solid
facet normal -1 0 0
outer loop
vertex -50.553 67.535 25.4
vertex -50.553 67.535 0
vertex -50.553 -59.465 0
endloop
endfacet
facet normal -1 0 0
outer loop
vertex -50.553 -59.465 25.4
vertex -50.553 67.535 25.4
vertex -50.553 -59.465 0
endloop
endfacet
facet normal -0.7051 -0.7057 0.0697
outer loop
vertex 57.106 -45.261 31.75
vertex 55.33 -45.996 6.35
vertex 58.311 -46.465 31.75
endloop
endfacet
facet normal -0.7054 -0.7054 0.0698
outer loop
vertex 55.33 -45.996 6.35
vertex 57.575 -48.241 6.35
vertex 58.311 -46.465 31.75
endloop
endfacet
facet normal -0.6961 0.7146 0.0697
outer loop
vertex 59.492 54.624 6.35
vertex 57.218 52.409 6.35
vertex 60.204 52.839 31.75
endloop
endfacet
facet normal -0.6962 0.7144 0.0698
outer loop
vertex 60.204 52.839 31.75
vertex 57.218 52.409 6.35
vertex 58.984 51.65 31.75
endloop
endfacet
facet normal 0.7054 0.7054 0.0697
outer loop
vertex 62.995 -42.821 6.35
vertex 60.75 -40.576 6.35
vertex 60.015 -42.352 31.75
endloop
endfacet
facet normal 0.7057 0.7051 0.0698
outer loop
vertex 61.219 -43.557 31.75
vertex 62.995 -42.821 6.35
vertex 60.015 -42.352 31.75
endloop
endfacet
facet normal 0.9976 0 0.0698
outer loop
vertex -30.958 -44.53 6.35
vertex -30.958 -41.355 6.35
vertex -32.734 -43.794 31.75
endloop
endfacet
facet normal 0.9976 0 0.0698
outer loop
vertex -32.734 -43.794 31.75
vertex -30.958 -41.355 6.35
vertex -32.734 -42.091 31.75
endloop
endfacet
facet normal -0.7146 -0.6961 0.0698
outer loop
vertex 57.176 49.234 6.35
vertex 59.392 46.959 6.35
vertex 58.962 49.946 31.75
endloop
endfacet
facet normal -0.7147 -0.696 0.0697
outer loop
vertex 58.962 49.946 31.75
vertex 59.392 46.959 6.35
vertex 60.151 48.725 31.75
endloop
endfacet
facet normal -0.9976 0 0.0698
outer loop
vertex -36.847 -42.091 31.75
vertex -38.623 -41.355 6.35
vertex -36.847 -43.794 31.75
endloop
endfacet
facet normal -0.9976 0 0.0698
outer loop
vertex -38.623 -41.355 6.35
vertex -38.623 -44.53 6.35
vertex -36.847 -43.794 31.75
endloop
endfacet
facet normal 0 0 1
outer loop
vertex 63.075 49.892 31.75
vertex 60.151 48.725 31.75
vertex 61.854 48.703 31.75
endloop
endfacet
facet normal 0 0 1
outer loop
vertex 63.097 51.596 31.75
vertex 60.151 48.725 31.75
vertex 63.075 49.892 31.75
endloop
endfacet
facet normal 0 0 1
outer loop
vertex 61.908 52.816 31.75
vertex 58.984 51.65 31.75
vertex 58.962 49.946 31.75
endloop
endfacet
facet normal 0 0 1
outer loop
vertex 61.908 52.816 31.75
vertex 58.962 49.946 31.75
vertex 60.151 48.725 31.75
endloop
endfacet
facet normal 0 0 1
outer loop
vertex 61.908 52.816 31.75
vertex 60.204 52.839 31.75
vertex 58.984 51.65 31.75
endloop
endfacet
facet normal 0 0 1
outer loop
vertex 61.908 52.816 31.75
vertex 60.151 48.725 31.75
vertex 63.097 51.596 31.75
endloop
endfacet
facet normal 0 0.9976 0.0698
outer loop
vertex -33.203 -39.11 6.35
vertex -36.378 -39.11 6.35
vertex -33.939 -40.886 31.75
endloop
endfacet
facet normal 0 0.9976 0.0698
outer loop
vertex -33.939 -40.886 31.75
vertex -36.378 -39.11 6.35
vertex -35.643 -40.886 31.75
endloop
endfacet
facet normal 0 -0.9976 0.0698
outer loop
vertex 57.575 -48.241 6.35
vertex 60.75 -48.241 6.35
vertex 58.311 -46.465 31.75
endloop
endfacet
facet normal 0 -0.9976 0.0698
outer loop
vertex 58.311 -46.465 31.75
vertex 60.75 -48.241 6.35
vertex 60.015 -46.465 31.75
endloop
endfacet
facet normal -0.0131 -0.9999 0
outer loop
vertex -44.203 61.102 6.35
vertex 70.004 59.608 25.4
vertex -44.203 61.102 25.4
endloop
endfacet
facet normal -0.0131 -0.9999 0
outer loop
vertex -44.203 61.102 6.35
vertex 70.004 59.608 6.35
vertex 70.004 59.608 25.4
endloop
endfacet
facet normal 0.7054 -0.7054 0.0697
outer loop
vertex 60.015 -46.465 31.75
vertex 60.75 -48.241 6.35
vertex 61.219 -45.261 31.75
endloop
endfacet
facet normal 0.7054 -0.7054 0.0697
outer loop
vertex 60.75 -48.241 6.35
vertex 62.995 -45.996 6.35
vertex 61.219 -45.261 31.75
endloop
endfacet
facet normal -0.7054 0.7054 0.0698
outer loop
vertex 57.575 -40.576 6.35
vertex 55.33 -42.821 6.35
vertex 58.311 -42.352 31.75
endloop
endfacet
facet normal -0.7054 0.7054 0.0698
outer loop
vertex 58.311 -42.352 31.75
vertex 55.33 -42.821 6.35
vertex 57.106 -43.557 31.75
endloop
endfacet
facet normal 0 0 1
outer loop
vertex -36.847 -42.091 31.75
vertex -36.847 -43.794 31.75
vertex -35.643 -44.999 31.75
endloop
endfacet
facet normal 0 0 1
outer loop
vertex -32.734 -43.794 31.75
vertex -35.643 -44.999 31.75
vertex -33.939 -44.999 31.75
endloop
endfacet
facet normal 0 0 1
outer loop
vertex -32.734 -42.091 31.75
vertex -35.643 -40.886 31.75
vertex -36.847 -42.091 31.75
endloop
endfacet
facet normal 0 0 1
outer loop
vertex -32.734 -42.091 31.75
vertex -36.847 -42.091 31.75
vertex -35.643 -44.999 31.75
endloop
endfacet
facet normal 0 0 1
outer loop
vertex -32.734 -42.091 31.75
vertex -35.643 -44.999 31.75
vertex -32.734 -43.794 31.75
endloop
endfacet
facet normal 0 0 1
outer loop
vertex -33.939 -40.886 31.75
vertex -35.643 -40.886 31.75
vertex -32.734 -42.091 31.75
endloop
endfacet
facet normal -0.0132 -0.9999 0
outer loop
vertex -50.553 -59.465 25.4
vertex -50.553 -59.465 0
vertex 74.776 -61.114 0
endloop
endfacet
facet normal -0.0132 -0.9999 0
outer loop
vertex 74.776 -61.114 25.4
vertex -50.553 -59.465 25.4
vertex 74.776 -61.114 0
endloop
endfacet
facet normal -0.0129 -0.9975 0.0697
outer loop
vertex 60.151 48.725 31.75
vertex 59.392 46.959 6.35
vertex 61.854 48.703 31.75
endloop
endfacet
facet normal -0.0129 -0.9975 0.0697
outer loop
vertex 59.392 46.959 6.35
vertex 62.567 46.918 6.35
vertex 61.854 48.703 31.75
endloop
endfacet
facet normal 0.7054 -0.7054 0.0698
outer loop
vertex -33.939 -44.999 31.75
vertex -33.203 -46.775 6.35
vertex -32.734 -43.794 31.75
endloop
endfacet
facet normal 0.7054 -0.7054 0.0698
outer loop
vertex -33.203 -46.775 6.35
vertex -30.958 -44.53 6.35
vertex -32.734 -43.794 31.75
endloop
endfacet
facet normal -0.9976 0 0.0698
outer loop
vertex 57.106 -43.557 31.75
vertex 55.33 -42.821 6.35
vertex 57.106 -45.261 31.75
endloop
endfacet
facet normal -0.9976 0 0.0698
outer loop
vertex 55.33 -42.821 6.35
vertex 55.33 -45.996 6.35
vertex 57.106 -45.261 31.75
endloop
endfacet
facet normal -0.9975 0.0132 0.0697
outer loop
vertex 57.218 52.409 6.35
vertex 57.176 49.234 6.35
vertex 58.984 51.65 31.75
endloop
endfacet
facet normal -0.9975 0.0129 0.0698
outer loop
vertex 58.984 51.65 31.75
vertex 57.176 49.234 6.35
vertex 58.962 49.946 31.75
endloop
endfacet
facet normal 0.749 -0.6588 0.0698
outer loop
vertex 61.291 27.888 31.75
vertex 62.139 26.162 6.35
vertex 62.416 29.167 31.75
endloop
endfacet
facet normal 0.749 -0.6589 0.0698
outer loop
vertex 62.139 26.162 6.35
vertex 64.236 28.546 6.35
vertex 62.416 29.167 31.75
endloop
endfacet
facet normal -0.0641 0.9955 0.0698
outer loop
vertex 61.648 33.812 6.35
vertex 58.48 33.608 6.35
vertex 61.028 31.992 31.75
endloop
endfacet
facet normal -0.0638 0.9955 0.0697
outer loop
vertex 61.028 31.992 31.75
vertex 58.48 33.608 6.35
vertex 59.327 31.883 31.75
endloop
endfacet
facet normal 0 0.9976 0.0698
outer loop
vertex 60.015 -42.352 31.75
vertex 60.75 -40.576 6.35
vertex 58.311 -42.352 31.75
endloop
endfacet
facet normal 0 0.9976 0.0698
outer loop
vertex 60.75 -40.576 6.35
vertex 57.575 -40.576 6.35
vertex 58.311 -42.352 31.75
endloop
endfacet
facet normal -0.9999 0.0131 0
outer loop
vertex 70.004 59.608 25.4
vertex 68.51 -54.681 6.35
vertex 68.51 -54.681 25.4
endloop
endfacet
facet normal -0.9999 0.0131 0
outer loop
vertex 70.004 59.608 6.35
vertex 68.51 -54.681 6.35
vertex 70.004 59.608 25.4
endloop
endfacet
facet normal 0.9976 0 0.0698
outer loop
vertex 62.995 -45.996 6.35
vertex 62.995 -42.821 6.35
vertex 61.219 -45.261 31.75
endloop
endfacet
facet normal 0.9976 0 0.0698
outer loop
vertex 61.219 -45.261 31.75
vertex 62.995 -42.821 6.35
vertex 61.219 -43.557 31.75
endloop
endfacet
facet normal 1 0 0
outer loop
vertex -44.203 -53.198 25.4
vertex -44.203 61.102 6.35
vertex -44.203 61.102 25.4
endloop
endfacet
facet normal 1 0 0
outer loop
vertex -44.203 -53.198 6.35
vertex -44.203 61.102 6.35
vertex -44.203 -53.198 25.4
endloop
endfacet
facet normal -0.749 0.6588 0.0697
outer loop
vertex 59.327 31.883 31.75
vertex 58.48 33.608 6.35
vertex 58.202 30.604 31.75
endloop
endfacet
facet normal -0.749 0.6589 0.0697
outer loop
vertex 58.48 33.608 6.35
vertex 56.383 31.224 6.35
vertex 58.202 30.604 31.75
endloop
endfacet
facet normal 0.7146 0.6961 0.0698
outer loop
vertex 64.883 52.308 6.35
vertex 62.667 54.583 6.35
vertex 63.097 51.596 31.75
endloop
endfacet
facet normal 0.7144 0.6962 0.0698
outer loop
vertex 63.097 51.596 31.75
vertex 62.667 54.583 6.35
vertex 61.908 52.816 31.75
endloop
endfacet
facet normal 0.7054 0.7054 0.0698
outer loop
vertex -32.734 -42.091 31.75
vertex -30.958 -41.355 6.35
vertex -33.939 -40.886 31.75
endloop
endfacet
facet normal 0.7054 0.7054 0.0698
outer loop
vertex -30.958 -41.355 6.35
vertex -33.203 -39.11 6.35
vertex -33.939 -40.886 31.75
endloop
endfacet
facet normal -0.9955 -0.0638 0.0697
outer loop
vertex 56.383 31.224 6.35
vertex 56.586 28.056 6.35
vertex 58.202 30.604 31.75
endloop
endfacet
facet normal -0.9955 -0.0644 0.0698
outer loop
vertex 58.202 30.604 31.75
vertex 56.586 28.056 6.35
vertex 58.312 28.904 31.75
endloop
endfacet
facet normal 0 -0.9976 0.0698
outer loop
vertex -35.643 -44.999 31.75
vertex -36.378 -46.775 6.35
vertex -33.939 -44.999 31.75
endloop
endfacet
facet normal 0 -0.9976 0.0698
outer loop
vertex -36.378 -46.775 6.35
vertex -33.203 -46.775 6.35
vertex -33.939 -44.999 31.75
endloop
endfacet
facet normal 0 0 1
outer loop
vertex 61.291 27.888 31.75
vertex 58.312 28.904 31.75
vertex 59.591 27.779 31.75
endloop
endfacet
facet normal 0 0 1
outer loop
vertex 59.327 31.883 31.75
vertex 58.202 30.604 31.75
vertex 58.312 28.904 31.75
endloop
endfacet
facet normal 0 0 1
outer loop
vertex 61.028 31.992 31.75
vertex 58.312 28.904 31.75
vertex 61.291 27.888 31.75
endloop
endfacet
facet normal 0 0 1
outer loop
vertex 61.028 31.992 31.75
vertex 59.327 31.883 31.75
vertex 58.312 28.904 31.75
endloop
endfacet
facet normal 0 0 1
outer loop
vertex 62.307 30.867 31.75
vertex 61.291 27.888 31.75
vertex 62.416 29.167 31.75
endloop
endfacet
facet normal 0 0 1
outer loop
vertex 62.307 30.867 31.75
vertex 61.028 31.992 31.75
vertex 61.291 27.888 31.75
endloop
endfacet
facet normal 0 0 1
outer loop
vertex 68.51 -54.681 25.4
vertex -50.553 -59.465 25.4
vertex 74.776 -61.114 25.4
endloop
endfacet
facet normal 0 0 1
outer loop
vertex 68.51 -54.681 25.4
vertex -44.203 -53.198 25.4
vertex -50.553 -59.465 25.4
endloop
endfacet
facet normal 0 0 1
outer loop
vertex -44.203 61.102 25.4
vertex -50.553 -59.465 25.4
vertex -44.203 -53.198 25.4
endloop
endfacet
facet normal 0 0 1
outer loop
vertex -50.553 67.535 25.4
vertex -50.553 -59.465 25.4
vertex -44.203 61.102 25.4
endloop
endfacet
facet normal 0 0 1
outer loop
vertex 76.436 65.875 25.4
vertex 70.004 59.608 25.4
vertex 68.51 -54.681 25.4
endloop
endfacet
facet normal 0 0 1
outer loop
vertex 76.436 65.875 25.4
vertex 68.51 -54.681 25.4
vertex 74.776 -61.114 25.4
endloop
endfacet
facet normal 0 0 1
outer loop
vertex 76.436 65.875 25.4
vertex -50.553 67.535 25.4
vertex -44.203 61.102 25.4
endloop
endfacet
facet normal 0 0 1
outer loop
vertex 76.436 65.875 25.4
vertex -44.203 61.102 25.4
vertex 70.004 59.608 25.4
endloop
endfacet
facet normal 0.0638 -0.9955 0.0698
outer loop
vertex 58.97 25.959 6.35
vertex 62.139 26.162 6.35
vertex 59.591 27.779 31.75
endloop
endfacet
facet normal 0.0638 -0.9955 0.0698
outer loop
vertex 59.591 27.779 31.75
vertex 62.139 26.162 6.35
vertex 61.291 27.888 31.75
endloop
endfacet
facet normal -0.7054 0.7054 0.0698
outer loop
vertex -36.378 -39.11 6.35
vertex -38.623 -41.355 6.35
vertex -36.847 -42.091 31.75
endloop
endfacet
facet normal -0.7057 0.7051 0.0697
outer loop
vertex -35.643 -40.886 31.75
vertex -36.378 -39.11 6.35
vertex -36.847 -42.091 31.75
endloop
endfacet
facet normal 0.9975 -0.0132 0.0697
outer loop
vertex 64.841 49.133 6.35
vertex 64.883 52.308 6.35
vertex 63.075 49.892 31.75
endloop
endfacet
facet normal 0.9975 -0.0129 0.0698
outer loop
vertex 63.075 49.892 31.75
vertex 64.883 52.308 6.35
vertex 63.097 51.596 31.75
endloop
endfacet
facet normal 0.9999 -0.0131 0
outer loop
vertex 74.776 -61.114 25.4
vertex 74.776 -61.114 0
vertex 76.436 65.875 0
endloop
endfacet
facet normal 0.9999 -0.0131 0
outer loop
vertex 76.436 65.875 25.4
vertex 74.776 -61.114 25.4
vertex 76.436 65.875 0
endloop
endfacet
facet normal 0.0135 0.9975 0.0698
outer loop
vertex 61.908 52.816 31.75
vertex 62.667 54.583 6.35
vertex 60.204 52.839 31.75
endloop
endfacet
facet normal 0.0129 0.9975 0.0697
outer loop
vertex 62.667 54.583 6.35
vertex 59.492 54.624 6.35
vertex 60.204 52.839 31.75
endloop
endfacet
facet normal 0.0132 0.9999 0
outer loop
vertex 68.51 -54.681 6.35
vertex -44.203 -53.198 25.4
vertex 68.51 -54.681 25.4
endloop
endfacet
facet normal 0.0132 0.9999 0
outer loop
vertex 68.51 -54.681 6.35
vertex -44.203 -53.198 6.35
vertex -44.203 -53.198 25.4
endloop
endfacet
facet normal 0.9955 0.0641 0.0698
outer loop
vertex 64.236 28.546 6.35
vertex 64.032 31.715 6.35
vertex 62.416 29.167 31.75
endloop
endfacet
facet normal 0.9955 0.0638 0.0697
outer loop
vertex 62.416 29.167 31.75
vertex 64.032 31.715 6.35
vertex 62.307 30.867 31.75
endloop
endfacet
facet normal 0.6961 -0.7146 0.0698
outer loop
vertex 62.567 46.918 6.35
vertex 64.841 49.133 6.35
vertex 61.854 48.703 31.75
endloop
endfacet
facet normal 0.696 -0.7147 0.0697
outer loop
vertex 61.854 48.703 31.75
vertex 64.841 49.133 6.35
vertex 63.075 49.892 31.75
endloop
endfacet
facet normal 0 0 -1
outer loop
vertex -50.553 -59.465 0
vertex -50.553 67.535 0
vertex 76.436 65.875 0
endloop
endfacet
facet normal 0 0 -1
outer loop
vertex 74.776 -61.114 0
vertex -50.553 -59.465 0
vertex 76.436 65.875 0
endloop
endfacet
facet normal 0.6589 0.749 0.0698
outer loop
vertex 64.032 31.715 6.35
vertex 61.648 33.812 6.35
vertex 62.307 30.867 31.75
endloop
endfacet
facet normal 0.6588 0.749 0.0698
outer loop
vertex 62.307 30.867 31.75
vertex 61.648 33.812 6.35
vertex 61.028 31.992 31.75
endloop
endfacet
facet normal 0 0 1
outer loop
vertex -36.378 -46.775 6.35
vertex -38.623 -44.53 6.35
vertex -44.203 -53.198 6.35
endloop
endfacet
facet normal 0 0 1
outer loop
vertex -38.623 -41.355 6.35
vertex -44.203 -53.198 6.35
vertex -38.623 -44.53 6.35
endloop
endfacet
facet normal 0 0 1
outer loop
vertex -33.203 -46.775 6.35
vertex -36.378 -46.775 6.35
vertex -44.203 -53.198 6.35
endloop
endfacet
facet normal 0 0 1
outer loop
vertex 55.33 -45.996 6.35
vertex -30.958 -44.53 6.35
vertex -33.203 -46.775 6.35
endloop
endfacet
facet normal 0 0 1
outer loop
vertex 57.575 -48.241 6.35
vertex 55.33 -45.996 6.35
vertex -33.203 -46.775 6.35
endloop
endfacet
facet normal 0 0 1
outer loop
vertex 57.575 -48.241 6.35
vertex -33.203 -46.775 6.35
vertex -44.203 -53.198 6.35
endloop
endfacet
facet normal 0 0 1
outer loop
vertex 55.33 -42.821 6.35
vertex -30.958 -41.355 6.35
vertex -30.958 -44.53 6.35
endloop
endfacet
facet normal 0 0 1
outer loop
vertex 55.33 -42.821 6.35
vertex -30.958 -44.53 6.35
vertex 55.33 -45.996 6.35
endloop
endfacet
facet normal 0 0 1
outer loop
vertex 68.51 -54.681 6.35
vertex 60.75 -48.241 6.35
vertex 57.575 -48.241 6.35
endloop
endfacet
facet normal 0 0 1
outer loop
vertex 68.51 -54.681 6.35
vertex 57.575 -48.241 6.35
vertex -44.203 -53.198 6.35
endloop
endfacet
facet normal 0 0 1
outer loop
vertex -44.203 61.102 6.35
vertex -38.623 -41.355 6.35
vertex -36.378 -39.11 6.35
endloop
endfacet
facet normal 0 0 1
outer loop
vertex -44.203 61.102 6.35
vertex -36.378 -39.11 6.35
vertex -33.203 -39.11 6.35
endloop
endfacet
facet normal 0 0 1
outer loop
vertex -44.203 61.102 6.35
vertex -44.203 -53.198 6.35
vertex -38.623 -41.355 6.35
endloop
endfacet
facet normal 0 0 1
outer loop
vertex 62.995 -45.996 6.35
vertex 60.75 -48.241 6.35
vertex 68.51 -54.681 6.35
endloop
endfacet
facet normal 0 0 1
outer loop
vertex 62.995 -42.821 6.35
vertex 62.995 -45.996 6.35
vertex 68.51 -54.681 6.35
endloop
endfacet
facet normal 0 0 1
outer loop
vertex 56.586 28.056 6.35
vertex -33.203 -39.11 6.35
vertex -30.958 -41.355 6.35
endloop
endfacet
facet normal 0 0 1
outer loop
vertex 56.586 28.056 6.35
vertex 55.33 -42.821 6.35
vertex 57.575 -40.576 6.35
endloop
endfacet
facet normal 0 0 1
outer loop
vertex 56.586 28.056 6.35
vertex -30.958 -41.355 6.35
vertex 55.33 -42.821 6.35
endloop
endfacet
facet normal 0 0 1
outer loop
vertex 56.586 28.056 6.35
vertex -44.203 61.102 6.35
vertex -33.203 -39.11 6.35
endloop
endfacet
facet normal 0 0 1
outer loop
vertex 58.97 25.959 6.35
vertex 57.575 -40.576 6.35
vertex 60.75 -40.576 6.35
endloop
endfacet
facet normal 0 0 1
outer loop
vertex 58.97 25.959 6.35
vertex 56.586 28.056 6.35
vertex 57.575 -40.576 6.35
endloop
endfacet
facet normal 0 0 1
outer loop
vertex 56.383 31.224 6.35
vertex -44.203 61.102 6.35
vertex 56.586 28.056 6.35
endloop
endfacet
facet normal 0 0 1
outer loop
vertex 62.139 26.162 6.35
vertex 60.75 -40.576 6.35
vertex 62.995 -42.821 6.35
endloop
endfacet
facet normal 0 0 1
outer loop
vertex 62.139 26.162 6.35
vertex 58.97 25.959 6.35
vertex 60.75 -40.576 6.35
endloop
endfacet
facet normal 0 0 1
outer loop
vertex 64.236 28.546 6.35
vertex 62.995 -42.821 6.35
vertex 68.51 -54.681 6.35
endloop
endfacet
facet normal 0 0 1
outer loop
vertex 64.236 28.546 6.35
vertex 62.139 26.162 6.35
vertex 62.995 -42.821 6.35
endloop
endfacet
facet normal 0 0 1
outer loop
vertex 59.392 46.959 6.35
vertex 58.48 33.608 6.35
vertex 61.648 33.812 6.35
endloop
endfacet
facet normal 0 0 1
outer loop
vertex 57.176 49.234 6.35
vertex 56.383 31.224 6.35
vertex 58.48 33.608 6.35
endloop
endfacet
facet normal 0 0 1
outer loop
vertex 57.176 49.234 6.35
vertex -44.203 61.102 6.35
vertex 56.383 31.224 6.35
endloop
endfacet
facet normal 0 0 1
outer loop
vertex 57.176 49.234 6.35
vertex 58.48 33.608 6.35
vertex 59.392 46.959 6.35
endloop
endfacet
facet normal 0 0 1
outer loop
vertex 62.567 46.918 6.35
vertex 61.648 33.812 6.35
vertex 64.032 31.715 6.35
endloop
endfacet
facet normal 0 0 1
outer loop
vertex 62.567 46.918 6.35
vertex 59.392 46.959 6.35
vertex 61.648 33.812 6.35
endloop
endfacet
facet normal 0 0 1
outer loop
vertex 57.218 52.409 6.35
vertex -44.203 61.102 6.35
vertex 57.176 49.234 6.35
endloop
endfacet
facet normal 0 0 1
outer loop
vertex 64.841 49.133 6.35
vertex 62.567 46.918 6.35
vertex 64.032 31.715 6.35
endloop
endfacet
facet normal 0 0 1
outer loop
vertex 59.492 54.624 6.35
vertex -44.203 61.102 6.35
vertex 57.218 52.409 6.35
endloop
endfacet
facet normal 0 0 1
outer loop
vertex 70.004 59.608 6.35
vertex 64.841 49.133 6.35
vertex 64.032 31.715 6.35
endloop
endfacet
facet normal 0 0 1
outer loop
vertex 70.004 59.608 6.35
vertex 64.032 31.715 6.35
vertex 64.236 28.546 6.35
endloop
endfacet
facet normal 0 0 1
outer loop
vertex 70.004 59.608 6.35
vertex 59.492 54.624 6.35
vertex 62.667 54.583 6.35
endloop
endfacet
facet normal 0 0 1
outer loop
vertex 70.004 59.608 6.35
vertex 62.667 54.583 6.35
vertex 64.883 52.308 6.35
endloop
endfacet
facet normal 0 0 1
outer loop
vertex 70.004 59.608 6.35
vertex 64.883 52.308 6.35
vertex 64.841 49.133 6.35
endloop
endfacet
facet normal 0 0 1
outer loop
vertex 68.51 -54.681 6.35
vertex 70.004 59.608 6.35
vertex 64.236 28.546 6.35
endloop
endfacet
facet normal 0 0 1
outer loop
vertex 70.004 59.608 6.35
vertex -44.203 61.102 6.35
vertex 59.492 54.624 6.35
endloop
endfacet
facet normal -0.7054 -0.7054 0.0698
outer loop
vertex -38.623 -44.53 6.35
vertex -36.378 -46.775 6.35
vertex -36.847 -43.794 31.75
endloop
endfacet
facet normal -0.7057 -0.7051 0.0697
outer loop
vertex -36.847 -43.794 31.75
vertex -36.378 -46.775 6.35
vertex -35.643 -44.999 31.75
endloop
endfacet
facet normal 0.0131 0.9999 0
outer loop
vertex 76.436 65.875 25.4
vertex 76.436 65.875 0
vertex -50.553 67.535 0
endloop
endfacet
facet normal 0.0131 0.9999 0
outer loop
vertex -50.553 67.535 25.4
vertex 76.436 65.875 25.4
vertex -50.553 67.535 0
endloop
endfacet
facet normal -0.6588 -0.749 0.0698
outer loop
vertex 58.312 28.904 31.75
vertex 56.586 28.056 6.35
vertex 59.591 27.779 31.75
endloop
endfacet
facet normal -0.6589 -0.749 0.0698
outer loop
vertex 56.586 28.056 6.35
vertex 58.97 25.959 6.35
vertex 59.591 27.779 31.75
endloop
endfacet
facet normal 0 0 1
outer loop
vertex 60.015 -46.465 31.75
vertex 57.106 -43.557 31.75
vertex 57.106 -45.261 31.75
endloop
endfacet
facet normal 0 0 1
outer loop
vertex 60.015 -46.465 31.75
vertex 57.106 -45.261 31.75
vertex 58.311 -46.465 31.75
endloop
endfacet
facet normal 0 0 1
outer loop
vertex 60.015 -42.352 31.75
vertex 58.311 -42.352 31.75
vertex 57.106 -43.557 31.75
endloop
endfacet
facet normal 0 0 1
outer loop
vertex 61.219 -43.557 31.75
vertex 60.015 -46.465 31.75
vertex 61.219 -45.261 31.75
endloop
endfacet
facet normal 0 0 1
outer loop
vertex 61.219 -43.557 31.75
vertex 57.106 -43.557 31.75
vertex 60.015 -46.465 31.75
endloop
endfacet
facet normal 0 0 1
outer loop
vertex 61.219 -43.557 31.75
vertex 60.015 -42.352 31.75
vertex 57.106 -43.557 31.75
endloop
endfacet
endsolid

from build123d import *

# Parameters (mm, degrees)
F1_DEPTH  = 25.4
F2_T      = -6.35
F4_DEPTH  = 25.4
F4_TAPER  = 4
F6_DEPTH  = 25.4
F6_TAPER  = 4
F8_DEPTH  = 25.4
F8_TAPER  = 4
F10_DEPTH = 25.4
F10_TAPER = 4


with BuildPart() as f1:
    # F0 (on Top) → F1 (new body)
    with BuildSketch(Plane.XY):
        Polygon((-50.552804023, 67.5352037176), (-50.552804023, -59.4647962824), (74.7760616566, -61.1142246816), (76.4363430164, 65.8749223579), align=None)
    extrude(amount=F1_DEPTH)

    # F2
    f2_openings = [f1.faces().sort_by_distance(p)[0] for p in [
        (12.528514, 3.347032, 25.4),
    ]]
    offset(amount=F2_T, openings=f2_openings)

    # F3 (on face) → F4 (join)
    with BuildSketch(Plane.XY.offset(6.35)):
        Polygon((57.2176291898, 52.4085088478), (57.1761186085, 49.2335088478), (59.3918302252, 46.959092404), (62.5668302252, 46.9175818226), (64.841246669, 49.1332934393), (64.8827572503, 52.3082934393), (62.6670456336, 54.5827098831), (59.4920456336, 54.6242204645), align=None)
    extrude(amount=F4_DEPTH, taper=F4_TAPER)

    # F5 (on face) → F6 (join)
    with BuildSketch(Plane.XY.offset(6.35)):
        Polygon((-38.6233556014, -41.3551133633), (-38.6233556014, -44.5301133633), (-36.3782915711, -46.7751773935), (-33.2032915711, -46.7751773935), (-30.9582275409, -44.5301133633), (-30.9582275409, -41.3551133633), (-33.2032915711, -39.110049333), (-36.3782915711, -39.110049333), align=None)
    extrude(amount=F6_DEPTH, taper=F6_TAPER)

    # F7 (on face) → F8 (join)
    with BuildSketch(Plane.XY.offset(6.35)):
        Polygon((60.750235939, -40.5762630585), (57.575235939, -40.5762630585), (55.3301719088, -42.8213270888), (55.3301719088, -45.9963270888), (57.575235939, -48.241391119), (60.750235939, -48.241391119), (62.9952999693, -45.9963270888), (62.9952999693, -42.8213270888), align=None)
    extrude(amount=F8_DEPTH, taper=F8_TAPER)

    # F9 (on face) → F10 (join)
    with BuildSketch(Plane.XY.offset(6.35)):
        Polygon((64.0322734141, 31.7149339752), (61.6480793024, 33.811656045), (58.4795930846, 33.6083826148), (56.3828710148, 31.2241885032), (56.586144445, 28.0557022853), (58.9703385566, 25.9589802155), (62.1388247745, 26.1622536457), (64.2355468443, 28.5464477573), align=None)
    extrude(amount=F10_DEPTH, taper=F10_TAPER)


solid = f1.part
